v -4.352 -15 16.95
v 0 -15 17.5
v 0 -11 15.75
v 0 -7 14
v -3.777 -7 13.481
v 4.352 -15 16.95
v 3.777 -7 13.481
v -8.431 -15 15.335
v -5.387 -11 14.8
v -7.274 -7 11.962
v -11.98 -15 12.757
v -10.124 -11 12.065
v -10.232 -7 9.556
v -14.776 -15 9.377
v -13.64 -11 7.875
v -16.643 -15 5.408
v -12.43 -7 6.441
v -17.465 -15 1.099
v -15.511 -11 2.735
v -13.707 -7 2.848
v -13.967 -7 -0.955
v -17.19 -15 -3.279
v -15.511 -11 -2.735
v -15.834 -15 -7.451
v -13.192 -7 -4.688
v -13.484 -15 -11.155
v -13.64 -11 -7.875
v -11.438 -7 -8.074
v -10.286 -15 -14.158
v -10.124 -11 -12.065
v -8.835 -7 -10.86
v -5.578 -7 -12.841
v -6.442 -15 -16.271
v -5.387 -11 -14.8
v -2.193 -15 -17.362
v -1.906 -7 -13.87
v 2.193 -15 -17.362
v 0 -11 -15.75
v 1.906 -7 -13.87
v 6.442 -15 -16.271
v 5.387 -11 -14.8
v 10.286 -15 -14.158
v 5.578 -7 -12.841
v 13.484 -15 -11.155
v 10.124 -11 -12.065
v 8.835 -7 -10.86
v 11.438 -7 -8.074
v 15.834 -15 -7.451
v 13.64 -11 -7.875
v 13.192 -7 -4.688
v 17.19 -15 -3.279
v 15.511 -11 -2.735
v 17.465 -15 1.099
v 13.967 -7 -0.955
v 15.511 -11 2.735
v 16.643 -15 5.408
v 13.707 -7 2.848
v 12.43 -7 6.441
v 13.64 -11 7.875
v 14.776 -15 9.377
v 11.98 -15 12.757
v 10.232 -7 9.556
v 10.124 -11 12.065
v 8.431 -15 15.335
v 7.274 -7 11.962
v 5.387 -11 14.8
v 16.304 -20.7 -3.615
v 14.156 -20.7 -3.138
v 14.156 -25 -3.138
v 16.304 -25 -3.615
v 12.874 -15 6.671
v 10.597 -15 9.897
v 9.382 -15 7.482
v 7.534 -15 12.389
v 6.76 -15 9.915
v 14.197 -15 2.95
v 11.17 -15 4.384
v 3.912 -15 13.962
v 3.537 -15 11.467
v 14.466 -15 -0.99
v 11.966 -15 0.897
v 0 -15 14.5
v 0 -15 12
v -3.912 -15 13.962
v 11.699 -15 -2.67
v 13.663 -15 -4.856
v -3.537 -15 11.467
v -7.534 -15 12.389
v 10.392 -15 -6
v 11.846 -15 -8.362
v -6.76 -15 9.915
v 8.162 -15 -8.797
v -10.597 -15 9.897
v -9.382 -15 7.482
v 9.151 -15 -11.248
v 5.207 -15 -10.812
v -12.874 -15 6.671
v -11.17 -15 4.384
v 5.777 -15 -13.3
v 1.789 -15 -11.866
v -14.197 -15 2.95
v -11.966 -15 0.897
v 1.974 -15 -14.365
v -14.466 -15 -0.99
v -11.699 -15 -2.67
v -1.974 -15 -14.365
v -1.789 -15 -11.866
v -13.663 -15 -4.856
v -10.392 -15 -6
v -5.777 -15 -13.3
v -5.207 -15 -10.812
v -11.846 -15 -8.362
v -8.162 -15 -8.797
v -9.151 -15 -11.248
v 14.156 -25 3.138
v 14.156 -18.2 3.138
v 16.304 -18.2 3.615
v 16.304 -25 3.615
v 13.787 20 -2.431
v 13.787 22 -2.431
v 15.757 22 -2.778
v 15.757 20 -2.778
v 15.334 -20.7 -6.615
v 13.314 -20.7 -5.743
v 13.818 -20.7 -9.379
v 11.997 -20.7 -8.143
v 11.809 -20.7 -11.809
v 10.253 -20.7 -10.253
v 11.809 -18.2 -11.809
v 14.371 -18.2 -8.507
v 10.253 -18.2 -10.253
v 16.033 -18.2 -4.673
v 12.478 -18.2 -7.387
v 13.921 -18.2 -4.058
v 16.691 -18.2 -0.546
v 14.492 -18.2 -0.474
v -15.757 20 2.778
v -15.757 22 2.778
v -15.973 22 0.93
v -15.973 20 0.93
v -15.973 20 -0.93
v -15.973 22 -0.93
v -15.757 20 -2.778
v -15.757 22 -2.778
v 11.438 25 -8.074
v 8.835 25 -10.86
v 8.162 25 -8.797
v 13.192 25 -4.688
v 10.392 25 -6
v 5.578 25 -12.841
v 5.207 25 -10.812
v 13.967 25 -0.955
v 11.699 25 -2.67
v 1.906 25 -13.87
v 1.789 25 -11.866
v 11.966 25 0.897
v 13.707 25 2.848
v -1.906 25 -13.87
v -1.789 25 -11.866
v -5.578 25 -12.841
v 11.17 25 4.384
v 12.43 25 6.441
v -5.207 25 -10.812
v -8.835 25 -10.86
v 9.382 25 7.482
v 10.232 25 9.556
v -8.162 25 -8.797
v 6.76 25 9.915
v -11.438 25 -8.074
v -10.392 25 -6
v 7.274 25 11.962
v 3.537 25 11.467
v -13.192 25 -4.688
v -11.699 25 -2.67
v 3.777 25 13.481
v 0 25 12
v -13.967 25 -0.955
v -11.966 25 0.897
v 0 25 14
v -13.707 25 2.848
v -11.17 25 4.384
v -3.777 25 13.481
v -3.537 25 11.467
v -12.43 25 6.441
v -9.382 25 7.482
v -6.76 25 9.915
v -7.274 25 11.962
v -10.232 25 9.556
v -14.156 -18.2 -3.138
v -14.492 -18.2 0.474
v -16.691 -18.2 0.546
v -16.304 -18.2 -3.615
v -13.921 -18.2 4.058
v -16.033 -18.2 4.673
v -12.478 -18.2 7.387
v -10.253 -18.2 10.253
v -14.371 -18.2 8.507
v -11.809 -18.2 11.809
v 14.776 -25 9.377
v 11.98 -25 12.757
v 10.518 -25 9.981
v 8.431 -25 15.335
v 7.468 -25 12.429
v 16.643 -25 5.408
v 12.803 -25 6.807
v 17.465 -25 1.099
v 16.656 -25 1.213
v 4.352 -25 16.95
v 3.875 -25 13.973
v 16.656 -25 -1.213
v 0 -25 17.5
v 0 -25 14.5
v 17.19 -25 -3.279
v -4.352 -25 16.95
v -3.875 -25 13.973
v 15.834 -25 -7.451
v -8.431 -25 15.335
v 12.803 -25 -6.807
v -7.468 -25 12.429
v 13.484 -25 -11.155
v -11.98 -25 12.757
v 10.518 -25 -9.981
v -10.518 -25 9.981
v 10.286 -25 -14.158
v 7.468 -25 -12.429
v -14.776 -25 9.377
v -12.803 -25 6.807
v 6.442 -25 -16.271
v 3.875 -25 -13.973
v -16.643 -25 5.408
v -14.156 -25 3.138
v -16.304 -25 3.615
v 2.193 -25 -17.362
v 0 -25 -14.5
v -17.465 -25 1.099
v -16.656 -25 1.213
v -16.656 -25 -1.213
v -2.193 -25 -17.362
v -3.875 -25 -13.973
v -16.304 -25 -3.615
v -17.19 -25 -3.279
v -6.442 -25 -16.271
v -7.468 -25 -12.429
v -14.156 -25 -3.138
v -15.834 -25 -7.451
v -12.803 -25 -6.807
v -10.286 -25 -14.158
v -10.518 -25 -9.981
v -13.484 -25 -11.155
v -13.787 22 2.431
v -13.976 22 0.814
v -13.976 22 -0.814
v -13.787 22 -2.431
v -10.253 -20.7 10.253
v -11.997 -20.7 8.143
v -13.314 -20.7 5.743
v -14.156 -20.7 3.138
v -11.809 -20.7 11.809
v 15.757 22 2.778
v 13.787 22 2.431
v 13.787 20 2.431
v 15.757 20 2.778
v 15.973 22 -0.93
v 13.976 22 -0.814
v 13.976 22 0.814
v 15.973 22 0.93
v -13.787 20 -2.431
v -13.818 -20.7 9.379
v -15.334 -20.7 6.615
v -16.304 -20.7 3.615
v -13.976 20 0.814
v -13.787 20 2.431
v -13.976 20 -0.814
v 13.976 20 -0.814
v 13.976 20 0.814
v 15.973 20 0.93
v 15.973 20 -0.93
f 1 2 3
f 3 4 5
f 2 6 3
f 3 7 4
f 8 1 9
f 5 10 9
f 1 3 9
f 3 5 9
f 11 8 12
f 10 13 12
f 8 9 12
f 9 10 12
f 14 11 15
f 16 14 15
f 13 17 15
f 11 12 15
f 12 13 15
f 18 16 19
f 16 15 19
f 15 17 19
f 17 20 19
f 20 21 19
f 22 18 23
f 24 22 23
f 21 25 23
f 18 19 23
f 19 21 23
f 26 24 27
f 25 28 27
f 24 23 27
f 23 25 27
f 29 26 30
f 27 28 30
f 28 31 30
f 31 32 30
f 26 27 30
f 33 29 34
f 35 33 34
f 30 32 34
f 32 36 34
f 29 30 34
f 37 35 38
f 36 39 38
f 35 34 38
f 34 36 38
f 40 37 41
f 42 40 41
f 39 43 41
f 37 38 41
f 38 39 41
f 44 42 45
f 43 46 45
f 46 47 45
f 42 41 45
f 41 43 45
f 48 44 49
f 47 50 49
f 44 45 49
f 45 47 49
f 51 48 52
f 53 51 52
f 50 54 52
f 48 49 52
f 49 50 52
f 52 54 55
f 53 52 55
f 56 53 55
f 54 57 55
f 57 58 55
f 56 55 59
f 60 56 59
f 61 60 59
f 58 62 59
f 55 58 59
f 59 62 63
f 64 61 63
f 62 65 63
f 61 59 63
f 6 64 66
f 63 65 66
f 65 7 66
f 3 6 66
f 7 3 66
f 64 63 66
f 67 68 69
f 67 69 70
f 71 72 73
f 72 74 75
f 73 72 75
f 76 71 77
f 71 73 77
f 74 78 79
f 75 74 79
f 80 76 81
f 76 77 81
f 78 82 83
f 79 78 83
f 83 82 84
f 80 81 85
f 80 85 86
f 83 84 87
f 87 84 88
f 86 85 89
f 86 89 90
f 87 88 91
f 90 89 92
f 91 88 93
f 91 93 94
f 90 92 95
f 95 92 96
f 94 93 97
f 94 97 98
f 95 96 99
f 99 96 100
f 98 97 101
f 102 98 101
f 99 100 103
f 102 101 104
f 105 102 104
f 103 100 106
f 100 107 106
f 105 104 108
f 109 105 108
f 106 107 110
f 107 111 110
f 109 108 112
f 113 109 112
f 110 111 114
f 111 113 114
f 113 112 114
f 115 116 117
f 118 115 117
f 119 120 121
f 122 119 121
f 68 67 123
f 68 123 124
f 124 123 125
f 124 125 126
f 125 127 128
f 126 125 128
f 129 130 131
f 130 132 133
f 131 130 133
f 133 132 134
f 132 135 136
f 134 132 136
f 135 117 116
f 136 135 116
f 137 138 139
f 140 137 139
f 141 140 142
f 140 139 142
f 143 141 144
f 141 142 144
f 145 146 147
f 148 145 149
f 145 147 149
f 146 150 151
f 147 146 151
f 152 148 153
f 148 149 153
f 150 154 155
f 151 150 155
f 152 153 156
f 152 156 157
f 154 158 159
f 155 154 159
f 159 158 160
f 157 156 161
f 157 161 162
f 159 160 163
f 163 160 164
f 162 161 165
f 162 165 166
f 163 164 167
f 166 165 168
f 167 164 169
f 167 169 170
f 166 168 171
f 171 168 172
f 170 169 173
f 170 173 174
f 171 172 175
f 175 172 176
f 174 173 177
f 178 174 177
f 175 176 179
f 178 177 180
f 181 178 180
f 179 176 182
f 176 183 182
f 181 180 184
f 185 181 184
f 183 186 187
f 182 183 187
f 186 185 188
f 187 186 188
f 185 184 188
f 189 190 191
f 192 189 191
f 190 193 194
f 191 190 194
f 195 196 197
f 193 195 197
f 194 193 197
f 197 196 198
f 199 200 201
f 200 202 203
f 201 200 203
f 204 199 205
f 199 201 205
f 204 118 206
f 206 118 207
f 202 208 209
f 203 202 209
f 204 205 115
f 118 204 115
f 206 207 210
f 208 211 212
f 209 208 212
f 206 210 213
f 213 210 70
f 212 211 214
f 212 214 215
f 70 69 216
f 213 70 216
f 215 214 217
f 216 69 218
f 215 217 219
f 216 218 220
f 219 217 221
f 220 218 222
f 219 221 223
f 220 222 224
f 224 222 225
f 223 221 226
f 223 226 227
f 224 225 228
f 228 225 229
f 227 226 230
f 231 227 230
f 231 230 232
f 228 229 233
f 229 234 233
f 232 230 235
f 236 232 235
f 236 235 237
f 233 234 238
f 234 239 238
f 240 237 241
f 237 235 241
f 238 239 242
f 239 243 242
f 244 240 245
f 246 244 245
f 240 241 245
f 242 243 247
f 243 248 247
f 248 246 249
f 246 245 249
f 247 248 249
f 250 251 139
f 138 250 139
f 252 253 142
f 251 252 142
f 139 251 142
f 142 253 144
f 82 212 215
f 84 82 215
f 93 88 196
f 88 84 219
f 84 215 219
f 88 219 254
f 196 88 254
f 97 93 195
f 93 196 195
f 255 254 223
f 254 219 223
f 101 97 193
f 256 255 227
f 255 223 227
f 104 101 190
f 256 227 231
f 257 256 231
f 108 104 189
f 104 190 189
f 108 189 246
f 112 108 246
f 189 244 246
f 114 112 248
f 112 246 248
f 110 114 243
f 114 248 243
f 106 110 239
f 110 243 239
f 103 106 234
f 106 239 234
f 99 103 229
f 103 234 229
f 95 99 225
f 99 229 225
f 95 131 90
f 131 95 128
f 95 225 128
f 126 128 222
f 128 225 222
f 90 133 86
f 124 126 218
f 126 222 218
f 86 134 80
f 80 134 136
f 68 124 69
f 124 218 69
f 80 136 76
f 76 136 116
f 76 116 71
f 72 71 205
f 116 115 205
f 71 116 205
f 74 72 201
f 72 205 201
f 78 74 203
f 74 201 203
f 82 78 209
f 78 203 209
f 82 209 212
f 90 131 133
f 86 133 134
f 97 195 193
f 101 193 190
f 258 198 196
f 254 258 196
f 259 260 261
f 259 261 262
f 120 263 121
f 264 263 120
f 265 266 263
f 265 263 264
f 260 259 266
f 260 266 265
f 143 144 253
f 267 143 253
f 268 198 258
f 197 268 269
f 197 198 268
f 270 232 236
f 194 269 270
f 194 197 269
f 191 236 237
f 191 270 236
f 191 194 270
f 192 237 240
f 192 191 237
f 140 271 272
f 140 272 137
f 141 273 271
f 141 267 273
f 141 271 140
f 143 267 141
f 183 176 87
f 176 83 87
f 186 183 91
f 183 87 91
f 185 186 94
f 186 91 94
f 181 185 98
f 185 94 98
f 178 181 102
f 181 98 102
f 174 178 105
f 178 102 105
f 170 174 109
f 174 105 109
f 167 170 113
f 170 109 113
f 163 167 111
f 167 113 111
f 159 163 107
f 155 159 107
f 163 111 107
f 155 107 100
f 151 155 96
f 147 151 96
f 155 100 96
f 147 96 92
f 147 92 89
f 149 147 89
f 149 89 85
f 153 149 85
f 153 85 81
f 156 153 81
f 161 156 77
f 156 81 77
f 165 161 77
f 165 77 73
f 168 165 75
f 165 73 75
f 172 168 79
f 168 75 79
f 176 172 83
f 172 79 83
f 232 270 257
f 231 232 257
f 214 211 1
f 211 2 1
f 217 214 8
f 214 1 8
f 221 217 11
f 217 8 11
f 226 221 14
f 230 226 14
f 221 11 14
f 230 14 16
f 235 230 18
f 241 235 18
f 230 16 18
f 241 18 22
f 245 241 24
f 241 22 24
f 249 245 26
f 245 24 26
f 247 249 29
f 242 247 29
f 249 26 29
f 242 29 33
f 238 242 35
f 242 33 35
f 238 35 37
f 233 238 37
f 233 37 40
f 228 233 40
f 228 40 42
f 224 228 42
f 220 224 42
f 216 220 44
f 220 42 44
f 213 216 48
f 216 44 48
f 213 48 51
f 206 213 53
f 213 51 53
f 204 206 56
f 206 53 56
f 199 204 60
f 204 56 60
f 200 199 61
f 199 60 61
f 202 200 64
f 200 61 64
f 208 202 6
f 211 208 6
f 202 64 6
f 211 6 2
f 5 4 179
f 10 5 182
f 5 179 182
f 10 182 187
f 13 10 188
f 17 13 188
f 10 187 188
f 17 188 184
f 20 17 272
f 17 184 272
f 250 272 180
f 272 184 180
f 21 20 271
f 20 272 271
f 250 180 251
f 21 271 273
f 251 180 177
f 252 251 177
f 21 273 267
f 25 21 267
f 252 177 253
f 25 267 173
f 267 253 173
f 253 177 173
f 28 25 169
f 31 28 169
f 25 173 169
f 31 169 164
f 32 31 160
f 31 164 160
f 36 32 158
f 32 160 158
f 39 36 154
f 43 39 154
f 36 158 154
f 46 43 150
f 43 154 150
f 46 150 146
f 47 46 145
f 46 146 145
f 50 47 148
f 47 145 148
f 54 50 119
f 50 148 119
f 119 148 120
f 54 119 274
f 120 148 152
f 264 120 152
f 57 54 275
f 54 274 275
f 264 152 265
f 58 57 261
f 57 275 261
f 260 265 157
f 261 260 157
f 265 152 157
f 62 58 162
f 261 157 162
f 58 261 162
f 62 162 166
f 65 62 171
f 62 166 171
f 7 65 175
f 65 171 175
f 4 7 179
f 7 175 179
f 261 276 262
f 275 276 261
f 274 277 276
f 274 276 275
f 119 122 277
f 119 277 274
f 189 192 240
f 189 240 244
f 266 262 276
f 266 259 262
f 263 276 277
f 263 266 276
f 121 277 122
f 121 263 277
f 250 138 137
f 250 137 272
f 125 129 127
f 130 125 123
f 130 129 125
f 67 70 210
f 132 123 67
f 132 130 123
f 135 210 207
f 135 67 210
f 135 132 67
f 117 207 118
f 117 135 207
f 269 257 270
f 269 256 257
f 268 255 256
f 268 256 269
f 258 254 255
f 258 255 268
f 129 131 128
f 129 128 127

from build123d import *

# Parameters (mm, degrees)
SKETCH2_W          = 2
SKETCH2_H          = 2
REVOLVE2_ANGLE     = 20
SKETCH3_W          = 2.2
SKETCH3_H          = 6.8
CUT_REVOLVE1_ANGLE = 25
SKETCH4_W          = 4.7
SKETCH4_H          = 2.5
CUT_REVOLVE2_ANGLE = 45


with BuildPart() as part:
    # Sketch1 → Revolve1 (revolve)
    with BuildSketch(Plane.XY, mode=Mode.PRIVATE) as revolve1_sk:
        Polygon((12, 25), (12, -15), (14.5, -15), (14.5, -25), (17.5, -25), (17.5, -15), (14, -7), (14, 25), align=None)
    revolve(revolve1_sk.sketch.rotate(Axis((0, 40.467735012, 0), (0, -1, 0)), 90), axis=Axis((0, 40.467735012, 0), (0, -1, 0)))

    # Sketch2 → Revolve2 (revolve, symmetric)
    with BuildSketch(Plane.XY) as revolve2_sk:
        with Locations((15, 21)):
            Rectangle(SKETCH2_W, SKETCH2_H)
        with Locations((-15, 21)):
            Rectangle(SKETCH2_W, SKETCH2_H)
    revolve(axis=Axis((0, 45.306661743, 0), (0, -1, 0)), revolution_arc=REVOLVE2_ANGLE / 2)
    revolve(revolve2_sk.sketch, axis=Axis((0, 45.306661743, 0), (0, 1, 0)), revolution_arc=REVOLVE2_ANGLE / 2)

    # Sketch3 → Cut-Revolve1 (revolve, symmetric, cut)
    with BuildSketch(Plane.XY) as cut_revolve1_sk:
        with Locations((-15.6, -21.6)):
            Rectangle(SKETCH3_W, SKETCH3_H)
        with Locations((15.6, -21.6)):
            Rectangle(SKETCH3_W, SKETCH3_H)
    revolve(axis=Axis((0, -11.020729768, 0), (0, -1, 0)), revolution_arc=CUT_REVOLVE1_ANGLE / 2, mode=Mode.SUBTRACT)
    revolve(cut_revolve1_sk.sketch, axis=Axis((0, -11.020729768, 0), (0, 1, 0)), revolution_arc=CUT_REVOLVE1_ANGLE / 2, mode=Mode.SUBTRACT)

    # Sketch4 → Cut-Revolve2 (revolve, cut)
    with BuildSketch(Plane.XY):
        with Locations((-14.35, -19.45)):
            Rectangle(SKETCH4_W, SKETCH4_H)
        with Locations((14.35, -19.45)):
            Rectangle(SKETCH4_W, SKETCH4_H)
    revolve(axis=Axis((0, -42.004114959, 0), (0, 1, 0)), revolution_arc=CUT_REVOLVE2_ANGLE, mode=Mode.SUBTRACT)


solid = part.part
